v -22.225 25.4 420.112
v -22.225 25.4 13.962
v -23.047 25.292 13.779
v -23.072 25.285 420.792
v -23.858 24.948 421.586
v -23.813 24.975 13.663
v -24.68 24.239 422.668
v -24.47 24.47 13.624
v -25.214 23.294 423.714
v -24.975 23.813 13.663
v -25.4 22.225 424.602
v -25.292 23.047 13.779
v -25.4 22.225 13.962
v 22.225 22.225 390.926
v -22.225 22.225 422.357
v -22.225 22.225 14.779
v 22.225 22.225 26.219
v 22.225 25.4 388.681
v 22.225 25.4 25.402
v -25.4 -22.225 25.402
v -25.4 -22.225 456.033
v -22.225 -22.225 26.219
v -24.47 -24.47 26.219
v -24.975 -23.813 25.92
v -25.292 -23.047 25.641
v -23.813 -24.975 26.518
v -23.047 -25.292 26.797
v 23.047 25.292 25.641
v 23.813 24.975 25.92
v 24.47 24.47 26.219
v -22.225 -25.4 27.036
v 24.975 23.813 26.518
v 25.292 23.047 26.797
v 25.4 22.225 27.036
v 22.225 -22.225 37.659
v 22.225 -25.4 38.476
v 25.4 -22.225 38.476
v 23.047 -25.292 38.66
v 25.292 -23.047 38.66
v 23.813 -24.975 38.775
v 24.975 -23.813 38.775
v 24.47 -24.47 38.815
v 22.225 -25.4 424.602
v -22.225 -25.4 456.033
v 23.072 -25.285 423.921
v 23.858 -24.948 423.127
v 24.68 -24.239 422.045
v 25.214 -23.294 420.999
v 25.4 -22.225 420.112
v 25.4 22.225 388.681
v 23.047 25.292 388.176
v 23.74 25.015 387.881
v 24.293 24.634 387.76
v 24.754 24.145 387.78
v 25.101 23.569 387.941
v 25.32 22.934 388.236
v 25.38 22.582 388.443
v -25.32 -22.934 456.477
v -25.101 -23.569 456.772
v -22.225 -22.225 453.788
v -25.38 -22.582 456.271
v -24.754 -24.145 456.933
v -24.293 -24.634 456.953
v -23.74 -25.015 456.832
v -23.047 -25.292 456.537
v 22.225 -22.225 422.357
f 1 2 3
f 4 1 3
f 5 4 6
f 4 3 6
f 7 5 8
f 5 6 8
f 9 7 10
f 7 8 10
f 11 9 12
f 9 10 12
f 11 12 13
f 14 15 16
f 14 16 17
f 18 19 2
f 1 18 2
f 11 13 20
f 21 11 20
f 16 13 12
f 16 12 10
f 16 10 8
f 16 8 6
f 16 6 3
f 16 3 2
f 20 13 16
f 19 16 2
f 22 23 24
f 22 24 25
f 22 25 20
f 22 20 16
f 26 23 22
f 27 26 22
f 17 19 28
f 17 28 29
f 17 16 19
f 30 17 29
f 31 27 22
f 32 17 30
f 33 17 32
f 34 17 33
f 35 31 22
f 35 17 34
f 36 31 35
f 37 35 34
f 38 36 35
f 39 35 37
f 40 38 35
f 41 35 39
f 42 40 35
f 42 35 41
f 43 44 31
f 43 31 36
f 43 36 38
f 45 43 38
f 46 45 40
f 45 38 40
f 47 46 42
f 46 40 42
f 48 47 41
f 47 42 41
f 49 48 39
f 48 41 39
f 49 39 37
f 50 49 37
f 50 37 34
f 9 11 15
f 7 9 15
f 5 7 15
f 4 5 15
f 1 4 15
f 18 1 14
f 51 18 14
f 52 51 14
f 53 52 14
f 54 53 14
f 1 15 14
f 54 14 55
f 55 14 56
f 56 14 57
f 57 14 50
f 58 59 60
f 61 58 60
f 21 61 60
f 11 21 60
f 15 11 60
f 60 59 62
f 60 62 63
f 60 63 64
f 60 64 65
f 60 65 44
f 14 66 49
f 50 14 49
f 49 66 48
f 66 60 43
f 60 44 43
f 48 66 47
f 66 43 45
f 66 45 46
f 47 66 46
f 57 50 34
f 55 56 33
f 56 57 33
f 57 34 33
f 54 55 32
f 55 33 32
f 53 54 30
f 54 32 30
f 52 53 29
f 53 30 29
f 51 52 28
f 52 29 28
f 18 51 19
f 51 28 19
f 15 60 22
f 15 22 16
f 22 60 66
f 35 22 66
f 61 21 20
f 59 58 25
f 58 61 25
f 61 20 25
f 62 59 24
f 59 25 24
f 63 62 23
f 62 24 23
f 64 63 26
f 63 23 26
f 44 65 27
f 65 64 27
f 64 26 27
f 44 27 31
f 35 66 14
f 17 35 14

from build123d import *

# Parameters (mm, degrees)
F0_W          = 44.45
F0_H          = 44.45
F1_DEPTH      = 457.2
F5_DEPTH      = 25.4
F5_DEPTH_BACK = 24.638
F8_W          = 152.4
F8_H          = 152.4
F9_DEPTH      = 24.638
F9_DEPTH_BACK = 25.4


with BuildPart() as f1:
    # F0 (on Top) → F1 (new body)
    with BuildSketch(Plane.XY):
        with BuildLine():
            ThreePointArc((25.4, 22.225), (24.4700640303, 24.4700640303), (22.225, 25.4))
            Line((22.225, 25.4), (-22.225, 25.4))
            ThreePointArc((-22.225, 25.4), (-24.4700640303, 24.4700640303), (-25.4, 22.225))
            Line((-25.4, 22.225), (-25.4, -22.225))
            ThreePointArc((-25.4, -22.225), (-24.4700640303, -24.4700640303), (-22.225, -25.4))
            Line((-22.225, -25.4), (22.225, -25.4))
            ThreePointArc((22.225, -25.4), (24.4700640303, -24.4700640303), (25.4, -22.225))
            Line((25.4, -22.225), (25.4, 22.225))
        make_face()
        Rectangle(F0_W, F0_H, mode=Mode.SUBTRACT)
    extrude(amount=F1_DEPTH)

    # F4 (on face) → F5 (cut, two sides)
    with BuildSketch(Plane(origin=(161.6446101792, 161.6446101792, 228.6), x_dir=(0.8660254038, -0.2886751346, -0.4082482905), z_dir=(-0.5, -0.5, -0.7071067812))) as f5_sk:
        Polygon((-110.453744999, 187.8757004726), (-186.653744999, 264.0757004726), (-262.853744999, 340.2757004726), (-262.853744999, 187.8757004726), align=None)
        Polygon((-262.853744999, 340.2757004726), (-186.653744999, 264.0757004726), (-110.453744999, 187.8757004726), (-110.453744999, 340.2757004726), align=None)
    extrude(amount=-F5_DEPTH, mode=Mode.SUBTRACT)
    extrude(f5_sk.sketch, amount=F5_DEPTH_BACK, mode=Mode.SUBTRACT)

    # F8 (on face) → F9 (cut, two sides)
    with BuildSketch(Plane(origin=(0, 0, 0), x_dir=(0.9703149544, 0.0602782519, 0.2342123429), z_dir=(0.2418447626, -0.2418447626, -0.9396926208))) as f9_sk:
        Rectangle(F8_W, F8_H)
    extrude(amount=-F9_DEPTH, mode=Mode.SUBTRACT)
    extrude(f9_sk.sketch, amount=F9_DEPTH_BACK, mode=Mode.SUBTRACT)


solid = f1.part
